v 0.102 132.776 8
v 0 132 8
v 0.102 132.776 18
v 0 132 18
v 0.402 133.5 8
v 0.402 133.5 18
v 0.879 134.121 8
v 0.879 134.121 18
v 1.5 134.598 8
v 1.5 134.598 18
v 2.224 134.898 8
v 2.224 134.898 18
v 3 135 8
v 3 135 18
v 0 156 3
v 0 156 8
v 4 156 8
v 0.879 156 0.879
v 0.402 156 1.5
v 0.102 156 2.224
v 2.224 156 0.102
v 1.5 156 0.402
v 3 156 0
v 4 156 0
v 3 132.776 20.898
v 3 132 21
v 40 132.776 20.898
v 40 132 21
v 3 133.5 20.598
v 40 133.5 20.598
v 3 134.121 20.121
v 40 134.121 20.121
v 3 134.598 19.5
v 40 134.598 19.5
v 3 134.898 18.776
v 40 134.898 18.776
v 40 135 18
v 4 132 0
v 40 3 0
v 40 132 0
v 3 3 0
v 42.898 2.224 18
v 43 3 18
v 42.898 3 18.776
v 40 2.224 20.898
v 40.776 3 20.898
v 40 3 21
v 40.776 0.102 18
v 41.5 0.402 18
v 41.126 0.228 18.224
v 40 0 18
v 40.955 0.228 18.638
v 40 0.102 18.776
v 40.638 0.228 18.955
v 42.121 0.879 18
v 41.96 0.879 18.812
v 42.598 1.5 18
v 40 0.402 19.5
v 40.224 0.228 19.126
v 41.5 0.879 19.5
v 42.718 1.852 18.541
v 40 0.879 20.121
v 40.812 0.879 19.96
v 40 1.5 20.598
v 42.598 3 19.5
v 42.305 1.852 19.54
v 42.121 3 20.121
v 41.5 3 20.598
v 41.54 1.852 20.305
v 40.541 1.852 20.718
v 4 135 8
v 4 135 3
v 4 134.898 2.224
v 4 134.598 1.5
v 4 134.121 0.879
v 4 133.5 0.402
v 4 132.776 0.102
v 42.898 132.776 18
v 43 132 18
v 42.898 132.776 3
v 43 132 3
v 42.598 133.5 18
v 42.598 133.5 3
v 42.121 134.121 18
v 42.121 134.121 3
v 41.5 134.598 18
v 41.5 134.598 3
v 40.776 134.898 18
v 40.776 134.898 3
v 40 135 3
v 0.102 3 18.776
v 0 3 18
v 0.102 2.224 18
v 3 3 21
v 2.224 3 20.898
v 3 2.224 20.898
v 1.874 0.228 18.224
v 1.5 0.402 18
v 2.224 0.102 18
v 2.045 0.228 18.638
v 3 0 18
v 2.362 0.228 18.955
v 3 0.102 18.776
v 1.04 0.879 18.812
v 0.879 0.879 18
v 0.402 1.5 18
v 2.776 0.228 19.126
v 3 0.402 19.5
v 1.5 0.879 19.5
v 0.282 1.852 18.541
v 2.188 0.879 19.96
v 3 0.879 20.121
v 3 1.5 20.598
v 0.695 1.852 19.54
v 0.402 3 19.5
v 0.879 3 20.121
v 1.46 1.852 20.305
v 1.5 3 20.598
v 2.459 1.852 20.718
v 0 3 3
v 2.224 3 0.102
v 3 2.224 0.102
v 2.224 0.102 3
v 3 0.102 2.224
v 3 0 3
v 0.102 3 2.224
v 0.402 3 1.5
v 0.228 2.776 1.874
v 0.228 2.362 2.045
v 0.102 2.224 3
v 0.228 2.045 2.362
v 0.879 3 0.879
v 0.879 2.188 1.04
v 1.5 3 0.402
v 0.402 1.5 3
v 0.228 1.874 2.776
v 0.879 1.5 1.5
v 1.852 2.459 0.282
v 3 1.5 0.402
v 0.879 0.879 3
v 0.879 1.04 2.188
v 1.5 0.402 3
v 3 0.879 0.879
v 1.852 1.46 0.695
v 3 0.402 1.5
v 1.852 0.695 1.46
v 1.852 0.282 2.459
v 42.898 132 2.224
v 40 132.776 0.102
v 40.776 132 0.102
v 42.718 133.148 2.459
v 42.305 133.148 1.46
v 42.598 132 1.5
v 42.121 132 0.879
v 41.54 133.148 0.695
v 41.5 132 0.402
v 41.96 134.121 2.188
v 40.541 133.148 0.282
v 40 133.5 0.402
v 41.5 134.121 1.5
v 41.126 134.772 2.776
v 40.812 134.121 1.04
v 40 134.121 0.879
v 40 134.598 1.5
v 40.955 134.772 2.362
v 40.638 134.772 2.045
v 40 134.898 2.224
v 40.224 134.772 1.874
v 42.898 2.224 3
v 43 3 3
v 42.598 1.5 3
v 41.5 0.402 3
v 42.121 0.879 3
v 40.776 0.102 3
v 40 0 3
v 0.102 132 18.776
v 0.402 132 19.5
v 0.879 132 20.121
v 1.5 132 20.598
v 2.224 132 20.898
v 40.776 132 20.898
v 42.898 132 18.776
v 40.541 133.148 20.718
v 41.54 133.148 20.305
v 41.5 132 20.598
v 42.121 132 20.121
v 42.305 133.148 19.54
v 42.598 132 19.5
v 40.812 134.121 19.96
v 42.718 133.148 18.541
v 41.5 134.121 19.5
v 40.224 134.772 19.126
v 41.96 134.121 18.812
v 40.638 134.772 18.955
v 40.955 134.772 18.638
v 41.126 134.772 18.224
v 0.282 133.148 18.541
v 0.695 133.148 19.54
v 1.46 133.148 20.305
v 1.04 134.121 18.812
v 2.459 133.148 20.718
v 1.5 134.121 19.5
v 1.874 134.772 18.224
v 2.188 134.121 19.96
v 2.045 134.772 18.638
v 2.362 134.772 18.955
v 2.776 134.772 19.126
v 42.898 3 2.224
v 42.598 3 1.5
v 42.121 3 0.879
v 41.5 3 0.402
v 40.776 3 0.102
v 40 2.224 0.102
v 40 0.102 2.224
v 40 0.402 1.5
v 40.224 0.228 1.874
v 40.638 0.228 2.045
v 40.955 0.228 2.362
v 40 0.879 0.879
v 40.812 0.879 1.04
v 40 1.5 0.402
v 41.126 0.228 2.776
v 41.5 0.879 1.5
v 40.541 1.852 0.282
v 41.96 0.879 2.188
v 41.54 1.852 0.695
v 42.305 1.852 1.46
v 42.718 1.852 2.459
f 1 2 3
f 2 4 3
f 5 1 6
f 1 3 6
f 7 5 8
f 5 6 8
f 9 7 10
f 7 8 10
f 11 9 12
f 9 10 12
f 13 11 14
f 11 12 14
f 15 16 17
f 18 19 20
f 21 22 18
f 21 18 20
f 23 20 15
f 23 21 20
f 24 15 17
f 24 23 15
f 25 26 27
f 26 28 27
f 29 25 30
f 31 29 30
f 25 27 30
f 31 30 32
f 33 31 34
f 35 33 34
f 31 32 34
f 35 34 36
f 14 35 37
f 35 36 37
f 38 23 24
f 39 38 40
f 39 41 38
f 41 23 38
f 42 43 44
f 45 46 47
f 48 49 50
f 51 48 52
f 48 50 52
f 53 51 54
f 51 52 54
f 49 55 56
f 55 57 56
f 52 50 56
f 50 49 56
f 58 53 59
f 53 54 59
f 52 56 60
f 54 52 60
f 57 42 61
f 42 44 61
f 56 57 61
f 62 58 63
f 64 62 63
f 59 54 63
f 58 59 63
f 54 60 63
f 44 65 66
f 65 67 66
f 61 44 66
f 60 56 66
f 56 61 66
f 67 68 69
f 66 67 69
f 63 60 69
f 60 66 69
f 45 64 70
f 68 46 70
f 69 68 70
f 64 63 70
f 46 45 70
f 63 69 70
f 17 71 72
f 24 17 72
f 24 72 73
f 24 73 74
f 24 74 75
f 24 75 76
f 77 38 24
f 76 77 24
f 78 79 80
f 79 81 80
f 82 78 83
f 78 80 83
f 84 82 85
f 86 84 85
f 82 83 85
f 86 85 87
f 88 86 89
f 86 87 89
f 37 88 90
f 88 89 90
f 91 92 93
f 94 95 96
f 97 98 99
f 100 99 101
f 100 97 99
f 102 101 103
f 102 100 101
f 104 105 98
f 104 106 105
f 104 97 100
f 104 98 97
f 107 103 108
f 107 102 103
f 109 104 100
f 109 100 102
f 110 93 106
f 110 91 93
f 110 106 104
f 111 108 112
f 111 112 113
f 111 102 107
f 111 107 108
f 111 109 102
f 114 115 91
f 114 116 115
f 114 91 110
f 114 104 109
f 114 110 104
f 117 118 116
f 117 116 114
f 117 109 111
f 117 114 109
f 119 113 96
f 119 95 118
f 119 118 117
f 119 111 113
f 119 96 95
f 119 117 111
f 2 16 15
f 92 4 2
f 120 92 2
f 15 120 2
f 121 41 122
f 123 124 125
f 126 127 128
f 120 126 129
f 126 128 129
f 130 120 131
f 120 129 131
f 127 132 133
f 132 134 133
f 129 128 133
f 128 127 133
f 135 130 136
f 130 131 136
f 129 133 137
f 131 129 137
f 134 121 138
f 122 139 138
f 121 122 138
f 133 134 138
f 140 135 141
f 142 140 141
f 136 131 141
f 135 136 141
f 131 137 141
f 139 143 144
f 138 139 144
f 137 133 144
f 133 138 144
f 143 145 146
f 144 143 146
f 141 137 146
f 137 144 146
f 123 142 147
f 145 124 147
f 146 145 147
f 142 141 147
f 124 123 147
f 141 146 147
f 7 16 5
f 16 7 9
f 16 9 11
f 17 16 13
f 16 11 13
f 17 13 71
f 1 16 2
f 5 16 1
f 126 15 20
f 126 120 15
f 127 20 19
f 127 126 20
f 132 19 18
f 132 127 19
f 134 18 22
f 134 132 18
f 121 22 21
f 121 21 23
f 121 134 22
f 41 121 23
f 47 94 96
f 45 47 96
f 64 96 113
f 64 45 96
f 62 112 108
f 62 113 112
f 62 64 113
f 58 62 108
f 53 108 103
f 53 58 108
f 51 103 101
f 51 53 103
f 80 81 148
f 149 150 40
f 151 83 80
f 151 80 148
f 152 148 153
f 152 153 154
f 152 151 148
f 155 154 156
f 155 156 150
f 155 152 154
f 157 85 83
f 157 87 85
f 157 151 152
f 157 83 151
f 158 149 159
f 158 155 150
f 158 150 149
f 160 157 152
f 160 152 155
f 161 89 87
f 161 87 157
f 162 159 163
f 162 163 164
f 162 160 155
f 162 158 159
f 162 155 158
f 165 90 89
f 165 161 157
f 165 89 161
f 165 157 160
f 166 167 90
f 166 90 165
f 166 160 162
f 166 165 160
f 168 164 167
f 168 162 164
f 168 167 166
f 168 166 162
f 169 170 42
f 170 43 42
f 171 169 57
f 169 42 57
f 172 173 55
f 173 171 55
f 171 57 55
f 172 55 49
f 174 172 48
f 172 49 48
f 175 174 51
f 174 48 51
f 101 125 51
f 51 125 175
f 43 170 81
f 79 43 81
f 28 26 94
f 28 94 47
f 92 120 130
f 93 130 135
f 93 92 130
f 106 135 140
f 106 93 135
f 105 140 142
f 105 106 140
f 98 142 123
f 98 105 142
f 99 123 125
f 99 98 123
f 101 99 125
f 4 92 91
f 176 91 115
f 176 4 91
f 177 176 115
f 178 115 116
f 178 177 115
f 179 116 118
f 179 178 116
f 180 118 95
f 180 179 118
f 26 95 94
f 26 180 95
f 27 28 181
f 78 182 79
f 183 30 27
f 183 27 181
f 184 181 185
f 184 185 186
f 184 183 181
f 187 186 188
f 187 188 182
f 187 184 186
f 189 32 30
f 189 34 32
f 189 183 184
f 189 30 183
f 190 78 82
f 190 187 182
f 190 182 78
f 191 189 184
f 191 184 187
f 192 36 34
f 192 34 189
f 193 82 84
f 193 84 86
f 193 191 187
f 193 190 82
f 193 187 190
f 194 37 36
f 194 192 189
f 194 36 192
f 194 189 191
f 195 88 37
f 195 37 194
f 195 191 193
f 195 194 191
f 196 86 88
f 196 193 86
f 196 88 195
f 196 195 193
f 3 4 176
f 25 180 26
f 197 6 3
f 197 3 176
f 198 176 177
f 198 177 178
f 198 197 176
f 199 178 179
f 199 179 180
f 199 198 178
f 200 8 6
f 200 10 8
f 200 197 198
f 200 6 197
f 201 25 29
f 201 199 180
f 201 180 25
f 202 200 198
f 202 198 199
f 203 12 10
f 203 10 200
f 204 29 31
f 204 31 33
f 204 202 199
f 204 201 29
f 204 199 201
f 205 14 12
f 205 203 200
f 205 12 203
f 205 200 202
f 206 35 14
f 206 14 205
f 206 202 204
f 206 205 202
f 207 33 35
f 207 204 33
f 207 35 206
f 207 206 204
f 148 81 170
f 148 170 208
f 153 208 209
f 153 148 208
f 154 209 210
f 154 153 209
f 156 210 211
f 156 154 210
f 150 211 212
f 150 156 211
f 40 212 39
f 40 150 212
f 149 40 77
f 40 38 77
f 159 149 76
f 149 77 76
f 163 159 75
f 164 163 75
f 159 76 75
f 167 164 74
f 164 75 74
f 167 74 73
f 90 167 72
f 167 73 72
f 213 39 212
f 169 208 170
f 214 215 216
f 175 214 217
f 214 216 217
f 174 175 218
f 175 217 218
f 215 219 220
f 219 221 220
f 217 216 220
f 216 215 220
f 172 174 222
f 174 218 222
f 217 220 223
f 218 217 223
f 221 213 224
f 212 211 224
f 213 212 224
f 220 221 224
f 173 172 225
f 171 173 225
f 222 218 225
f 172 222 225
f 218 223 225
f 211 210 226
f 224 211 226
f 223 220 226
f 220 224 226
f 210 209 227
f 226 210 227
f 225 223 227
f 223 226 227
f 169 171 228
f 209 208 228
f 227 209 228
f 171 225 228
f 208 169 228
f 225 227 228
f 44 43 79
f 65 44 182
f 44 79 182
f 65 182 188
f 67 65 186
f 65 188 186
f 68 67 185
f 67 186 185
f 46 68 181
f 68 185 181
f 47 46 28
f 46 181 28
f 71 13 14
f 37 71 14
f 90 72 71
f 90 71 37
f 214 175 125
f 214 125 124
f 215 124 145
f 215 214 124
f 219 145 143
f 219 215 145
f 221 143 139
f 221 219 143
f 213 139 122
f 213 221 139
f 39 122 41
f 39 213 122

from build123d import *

# Parameters (mm, degrees)
ESBO_O1_W                = 43
ESBO_O1_H                = 135
RESSALTO_EXTRUS_O1_DEPTH = 21
ESBO_O2_W                = 4
ESBO_O2_H                = 8
RESSALTO_EXTRUS_O2_DEPTH = 21
FILETE2_R                = 3
FILETE3_R                = 3


with BuildPart() as part:
    # Esboço1 → Ressalto-extrusão1 (new body)
    with BuildSketch(Plane.XY):
        with Locations((21.5, 67.5)):
            Rectangle(ESBO_O1_W, ESBO_O1_H)
    extrude(amount=RESSALTO_EXTRUS_O1_DEPTH)

    # Esboço2 → Ressalto-extrusão2 (add)
    with BuildSketch(Plane(origin=(0, 135, 0), x_dir=(1, 0, 0), z_dir=(0, 1, 0))):
        with Locations((2, -4)):
            Rectangle(ESBO_O2_W, ESBO_O2_H)
    extrude(amount=RESSALTO_EXTRUS_O2_DEPTH)

    # Filete2
    filete2_edges = [part.edges().sort_by_distance(p)[0] for p in [
        (43, 67.5, 21),
        (0, 67.5, 21),
        (43, 67.5, 0),
        (21.5, 0, 0),
        (0, 78, 0),
        (43, 0, 10.5),
        (0, 0, 10.5),
        (21.5, 0, 21),
    ]]
    fillet(filete2_edges, radius=FILETE2_R)

    # Filete3
    filete3_edges = [part.edges().sort_by_distance(p)[0] for p in [
        (0, 135, 13),
        (21.5, 135, 21),
        (43, 135, 10.5),
        (22, 135, 0),
        (42.121320344, 135, 20.121320344),
        (0.878679656, 135, 20.121320344),
        (42.121320344, 135, 0.878679656),
    ]]
    fillet(filete3_edges, radius=FILETE3_R)


solid = part.part
